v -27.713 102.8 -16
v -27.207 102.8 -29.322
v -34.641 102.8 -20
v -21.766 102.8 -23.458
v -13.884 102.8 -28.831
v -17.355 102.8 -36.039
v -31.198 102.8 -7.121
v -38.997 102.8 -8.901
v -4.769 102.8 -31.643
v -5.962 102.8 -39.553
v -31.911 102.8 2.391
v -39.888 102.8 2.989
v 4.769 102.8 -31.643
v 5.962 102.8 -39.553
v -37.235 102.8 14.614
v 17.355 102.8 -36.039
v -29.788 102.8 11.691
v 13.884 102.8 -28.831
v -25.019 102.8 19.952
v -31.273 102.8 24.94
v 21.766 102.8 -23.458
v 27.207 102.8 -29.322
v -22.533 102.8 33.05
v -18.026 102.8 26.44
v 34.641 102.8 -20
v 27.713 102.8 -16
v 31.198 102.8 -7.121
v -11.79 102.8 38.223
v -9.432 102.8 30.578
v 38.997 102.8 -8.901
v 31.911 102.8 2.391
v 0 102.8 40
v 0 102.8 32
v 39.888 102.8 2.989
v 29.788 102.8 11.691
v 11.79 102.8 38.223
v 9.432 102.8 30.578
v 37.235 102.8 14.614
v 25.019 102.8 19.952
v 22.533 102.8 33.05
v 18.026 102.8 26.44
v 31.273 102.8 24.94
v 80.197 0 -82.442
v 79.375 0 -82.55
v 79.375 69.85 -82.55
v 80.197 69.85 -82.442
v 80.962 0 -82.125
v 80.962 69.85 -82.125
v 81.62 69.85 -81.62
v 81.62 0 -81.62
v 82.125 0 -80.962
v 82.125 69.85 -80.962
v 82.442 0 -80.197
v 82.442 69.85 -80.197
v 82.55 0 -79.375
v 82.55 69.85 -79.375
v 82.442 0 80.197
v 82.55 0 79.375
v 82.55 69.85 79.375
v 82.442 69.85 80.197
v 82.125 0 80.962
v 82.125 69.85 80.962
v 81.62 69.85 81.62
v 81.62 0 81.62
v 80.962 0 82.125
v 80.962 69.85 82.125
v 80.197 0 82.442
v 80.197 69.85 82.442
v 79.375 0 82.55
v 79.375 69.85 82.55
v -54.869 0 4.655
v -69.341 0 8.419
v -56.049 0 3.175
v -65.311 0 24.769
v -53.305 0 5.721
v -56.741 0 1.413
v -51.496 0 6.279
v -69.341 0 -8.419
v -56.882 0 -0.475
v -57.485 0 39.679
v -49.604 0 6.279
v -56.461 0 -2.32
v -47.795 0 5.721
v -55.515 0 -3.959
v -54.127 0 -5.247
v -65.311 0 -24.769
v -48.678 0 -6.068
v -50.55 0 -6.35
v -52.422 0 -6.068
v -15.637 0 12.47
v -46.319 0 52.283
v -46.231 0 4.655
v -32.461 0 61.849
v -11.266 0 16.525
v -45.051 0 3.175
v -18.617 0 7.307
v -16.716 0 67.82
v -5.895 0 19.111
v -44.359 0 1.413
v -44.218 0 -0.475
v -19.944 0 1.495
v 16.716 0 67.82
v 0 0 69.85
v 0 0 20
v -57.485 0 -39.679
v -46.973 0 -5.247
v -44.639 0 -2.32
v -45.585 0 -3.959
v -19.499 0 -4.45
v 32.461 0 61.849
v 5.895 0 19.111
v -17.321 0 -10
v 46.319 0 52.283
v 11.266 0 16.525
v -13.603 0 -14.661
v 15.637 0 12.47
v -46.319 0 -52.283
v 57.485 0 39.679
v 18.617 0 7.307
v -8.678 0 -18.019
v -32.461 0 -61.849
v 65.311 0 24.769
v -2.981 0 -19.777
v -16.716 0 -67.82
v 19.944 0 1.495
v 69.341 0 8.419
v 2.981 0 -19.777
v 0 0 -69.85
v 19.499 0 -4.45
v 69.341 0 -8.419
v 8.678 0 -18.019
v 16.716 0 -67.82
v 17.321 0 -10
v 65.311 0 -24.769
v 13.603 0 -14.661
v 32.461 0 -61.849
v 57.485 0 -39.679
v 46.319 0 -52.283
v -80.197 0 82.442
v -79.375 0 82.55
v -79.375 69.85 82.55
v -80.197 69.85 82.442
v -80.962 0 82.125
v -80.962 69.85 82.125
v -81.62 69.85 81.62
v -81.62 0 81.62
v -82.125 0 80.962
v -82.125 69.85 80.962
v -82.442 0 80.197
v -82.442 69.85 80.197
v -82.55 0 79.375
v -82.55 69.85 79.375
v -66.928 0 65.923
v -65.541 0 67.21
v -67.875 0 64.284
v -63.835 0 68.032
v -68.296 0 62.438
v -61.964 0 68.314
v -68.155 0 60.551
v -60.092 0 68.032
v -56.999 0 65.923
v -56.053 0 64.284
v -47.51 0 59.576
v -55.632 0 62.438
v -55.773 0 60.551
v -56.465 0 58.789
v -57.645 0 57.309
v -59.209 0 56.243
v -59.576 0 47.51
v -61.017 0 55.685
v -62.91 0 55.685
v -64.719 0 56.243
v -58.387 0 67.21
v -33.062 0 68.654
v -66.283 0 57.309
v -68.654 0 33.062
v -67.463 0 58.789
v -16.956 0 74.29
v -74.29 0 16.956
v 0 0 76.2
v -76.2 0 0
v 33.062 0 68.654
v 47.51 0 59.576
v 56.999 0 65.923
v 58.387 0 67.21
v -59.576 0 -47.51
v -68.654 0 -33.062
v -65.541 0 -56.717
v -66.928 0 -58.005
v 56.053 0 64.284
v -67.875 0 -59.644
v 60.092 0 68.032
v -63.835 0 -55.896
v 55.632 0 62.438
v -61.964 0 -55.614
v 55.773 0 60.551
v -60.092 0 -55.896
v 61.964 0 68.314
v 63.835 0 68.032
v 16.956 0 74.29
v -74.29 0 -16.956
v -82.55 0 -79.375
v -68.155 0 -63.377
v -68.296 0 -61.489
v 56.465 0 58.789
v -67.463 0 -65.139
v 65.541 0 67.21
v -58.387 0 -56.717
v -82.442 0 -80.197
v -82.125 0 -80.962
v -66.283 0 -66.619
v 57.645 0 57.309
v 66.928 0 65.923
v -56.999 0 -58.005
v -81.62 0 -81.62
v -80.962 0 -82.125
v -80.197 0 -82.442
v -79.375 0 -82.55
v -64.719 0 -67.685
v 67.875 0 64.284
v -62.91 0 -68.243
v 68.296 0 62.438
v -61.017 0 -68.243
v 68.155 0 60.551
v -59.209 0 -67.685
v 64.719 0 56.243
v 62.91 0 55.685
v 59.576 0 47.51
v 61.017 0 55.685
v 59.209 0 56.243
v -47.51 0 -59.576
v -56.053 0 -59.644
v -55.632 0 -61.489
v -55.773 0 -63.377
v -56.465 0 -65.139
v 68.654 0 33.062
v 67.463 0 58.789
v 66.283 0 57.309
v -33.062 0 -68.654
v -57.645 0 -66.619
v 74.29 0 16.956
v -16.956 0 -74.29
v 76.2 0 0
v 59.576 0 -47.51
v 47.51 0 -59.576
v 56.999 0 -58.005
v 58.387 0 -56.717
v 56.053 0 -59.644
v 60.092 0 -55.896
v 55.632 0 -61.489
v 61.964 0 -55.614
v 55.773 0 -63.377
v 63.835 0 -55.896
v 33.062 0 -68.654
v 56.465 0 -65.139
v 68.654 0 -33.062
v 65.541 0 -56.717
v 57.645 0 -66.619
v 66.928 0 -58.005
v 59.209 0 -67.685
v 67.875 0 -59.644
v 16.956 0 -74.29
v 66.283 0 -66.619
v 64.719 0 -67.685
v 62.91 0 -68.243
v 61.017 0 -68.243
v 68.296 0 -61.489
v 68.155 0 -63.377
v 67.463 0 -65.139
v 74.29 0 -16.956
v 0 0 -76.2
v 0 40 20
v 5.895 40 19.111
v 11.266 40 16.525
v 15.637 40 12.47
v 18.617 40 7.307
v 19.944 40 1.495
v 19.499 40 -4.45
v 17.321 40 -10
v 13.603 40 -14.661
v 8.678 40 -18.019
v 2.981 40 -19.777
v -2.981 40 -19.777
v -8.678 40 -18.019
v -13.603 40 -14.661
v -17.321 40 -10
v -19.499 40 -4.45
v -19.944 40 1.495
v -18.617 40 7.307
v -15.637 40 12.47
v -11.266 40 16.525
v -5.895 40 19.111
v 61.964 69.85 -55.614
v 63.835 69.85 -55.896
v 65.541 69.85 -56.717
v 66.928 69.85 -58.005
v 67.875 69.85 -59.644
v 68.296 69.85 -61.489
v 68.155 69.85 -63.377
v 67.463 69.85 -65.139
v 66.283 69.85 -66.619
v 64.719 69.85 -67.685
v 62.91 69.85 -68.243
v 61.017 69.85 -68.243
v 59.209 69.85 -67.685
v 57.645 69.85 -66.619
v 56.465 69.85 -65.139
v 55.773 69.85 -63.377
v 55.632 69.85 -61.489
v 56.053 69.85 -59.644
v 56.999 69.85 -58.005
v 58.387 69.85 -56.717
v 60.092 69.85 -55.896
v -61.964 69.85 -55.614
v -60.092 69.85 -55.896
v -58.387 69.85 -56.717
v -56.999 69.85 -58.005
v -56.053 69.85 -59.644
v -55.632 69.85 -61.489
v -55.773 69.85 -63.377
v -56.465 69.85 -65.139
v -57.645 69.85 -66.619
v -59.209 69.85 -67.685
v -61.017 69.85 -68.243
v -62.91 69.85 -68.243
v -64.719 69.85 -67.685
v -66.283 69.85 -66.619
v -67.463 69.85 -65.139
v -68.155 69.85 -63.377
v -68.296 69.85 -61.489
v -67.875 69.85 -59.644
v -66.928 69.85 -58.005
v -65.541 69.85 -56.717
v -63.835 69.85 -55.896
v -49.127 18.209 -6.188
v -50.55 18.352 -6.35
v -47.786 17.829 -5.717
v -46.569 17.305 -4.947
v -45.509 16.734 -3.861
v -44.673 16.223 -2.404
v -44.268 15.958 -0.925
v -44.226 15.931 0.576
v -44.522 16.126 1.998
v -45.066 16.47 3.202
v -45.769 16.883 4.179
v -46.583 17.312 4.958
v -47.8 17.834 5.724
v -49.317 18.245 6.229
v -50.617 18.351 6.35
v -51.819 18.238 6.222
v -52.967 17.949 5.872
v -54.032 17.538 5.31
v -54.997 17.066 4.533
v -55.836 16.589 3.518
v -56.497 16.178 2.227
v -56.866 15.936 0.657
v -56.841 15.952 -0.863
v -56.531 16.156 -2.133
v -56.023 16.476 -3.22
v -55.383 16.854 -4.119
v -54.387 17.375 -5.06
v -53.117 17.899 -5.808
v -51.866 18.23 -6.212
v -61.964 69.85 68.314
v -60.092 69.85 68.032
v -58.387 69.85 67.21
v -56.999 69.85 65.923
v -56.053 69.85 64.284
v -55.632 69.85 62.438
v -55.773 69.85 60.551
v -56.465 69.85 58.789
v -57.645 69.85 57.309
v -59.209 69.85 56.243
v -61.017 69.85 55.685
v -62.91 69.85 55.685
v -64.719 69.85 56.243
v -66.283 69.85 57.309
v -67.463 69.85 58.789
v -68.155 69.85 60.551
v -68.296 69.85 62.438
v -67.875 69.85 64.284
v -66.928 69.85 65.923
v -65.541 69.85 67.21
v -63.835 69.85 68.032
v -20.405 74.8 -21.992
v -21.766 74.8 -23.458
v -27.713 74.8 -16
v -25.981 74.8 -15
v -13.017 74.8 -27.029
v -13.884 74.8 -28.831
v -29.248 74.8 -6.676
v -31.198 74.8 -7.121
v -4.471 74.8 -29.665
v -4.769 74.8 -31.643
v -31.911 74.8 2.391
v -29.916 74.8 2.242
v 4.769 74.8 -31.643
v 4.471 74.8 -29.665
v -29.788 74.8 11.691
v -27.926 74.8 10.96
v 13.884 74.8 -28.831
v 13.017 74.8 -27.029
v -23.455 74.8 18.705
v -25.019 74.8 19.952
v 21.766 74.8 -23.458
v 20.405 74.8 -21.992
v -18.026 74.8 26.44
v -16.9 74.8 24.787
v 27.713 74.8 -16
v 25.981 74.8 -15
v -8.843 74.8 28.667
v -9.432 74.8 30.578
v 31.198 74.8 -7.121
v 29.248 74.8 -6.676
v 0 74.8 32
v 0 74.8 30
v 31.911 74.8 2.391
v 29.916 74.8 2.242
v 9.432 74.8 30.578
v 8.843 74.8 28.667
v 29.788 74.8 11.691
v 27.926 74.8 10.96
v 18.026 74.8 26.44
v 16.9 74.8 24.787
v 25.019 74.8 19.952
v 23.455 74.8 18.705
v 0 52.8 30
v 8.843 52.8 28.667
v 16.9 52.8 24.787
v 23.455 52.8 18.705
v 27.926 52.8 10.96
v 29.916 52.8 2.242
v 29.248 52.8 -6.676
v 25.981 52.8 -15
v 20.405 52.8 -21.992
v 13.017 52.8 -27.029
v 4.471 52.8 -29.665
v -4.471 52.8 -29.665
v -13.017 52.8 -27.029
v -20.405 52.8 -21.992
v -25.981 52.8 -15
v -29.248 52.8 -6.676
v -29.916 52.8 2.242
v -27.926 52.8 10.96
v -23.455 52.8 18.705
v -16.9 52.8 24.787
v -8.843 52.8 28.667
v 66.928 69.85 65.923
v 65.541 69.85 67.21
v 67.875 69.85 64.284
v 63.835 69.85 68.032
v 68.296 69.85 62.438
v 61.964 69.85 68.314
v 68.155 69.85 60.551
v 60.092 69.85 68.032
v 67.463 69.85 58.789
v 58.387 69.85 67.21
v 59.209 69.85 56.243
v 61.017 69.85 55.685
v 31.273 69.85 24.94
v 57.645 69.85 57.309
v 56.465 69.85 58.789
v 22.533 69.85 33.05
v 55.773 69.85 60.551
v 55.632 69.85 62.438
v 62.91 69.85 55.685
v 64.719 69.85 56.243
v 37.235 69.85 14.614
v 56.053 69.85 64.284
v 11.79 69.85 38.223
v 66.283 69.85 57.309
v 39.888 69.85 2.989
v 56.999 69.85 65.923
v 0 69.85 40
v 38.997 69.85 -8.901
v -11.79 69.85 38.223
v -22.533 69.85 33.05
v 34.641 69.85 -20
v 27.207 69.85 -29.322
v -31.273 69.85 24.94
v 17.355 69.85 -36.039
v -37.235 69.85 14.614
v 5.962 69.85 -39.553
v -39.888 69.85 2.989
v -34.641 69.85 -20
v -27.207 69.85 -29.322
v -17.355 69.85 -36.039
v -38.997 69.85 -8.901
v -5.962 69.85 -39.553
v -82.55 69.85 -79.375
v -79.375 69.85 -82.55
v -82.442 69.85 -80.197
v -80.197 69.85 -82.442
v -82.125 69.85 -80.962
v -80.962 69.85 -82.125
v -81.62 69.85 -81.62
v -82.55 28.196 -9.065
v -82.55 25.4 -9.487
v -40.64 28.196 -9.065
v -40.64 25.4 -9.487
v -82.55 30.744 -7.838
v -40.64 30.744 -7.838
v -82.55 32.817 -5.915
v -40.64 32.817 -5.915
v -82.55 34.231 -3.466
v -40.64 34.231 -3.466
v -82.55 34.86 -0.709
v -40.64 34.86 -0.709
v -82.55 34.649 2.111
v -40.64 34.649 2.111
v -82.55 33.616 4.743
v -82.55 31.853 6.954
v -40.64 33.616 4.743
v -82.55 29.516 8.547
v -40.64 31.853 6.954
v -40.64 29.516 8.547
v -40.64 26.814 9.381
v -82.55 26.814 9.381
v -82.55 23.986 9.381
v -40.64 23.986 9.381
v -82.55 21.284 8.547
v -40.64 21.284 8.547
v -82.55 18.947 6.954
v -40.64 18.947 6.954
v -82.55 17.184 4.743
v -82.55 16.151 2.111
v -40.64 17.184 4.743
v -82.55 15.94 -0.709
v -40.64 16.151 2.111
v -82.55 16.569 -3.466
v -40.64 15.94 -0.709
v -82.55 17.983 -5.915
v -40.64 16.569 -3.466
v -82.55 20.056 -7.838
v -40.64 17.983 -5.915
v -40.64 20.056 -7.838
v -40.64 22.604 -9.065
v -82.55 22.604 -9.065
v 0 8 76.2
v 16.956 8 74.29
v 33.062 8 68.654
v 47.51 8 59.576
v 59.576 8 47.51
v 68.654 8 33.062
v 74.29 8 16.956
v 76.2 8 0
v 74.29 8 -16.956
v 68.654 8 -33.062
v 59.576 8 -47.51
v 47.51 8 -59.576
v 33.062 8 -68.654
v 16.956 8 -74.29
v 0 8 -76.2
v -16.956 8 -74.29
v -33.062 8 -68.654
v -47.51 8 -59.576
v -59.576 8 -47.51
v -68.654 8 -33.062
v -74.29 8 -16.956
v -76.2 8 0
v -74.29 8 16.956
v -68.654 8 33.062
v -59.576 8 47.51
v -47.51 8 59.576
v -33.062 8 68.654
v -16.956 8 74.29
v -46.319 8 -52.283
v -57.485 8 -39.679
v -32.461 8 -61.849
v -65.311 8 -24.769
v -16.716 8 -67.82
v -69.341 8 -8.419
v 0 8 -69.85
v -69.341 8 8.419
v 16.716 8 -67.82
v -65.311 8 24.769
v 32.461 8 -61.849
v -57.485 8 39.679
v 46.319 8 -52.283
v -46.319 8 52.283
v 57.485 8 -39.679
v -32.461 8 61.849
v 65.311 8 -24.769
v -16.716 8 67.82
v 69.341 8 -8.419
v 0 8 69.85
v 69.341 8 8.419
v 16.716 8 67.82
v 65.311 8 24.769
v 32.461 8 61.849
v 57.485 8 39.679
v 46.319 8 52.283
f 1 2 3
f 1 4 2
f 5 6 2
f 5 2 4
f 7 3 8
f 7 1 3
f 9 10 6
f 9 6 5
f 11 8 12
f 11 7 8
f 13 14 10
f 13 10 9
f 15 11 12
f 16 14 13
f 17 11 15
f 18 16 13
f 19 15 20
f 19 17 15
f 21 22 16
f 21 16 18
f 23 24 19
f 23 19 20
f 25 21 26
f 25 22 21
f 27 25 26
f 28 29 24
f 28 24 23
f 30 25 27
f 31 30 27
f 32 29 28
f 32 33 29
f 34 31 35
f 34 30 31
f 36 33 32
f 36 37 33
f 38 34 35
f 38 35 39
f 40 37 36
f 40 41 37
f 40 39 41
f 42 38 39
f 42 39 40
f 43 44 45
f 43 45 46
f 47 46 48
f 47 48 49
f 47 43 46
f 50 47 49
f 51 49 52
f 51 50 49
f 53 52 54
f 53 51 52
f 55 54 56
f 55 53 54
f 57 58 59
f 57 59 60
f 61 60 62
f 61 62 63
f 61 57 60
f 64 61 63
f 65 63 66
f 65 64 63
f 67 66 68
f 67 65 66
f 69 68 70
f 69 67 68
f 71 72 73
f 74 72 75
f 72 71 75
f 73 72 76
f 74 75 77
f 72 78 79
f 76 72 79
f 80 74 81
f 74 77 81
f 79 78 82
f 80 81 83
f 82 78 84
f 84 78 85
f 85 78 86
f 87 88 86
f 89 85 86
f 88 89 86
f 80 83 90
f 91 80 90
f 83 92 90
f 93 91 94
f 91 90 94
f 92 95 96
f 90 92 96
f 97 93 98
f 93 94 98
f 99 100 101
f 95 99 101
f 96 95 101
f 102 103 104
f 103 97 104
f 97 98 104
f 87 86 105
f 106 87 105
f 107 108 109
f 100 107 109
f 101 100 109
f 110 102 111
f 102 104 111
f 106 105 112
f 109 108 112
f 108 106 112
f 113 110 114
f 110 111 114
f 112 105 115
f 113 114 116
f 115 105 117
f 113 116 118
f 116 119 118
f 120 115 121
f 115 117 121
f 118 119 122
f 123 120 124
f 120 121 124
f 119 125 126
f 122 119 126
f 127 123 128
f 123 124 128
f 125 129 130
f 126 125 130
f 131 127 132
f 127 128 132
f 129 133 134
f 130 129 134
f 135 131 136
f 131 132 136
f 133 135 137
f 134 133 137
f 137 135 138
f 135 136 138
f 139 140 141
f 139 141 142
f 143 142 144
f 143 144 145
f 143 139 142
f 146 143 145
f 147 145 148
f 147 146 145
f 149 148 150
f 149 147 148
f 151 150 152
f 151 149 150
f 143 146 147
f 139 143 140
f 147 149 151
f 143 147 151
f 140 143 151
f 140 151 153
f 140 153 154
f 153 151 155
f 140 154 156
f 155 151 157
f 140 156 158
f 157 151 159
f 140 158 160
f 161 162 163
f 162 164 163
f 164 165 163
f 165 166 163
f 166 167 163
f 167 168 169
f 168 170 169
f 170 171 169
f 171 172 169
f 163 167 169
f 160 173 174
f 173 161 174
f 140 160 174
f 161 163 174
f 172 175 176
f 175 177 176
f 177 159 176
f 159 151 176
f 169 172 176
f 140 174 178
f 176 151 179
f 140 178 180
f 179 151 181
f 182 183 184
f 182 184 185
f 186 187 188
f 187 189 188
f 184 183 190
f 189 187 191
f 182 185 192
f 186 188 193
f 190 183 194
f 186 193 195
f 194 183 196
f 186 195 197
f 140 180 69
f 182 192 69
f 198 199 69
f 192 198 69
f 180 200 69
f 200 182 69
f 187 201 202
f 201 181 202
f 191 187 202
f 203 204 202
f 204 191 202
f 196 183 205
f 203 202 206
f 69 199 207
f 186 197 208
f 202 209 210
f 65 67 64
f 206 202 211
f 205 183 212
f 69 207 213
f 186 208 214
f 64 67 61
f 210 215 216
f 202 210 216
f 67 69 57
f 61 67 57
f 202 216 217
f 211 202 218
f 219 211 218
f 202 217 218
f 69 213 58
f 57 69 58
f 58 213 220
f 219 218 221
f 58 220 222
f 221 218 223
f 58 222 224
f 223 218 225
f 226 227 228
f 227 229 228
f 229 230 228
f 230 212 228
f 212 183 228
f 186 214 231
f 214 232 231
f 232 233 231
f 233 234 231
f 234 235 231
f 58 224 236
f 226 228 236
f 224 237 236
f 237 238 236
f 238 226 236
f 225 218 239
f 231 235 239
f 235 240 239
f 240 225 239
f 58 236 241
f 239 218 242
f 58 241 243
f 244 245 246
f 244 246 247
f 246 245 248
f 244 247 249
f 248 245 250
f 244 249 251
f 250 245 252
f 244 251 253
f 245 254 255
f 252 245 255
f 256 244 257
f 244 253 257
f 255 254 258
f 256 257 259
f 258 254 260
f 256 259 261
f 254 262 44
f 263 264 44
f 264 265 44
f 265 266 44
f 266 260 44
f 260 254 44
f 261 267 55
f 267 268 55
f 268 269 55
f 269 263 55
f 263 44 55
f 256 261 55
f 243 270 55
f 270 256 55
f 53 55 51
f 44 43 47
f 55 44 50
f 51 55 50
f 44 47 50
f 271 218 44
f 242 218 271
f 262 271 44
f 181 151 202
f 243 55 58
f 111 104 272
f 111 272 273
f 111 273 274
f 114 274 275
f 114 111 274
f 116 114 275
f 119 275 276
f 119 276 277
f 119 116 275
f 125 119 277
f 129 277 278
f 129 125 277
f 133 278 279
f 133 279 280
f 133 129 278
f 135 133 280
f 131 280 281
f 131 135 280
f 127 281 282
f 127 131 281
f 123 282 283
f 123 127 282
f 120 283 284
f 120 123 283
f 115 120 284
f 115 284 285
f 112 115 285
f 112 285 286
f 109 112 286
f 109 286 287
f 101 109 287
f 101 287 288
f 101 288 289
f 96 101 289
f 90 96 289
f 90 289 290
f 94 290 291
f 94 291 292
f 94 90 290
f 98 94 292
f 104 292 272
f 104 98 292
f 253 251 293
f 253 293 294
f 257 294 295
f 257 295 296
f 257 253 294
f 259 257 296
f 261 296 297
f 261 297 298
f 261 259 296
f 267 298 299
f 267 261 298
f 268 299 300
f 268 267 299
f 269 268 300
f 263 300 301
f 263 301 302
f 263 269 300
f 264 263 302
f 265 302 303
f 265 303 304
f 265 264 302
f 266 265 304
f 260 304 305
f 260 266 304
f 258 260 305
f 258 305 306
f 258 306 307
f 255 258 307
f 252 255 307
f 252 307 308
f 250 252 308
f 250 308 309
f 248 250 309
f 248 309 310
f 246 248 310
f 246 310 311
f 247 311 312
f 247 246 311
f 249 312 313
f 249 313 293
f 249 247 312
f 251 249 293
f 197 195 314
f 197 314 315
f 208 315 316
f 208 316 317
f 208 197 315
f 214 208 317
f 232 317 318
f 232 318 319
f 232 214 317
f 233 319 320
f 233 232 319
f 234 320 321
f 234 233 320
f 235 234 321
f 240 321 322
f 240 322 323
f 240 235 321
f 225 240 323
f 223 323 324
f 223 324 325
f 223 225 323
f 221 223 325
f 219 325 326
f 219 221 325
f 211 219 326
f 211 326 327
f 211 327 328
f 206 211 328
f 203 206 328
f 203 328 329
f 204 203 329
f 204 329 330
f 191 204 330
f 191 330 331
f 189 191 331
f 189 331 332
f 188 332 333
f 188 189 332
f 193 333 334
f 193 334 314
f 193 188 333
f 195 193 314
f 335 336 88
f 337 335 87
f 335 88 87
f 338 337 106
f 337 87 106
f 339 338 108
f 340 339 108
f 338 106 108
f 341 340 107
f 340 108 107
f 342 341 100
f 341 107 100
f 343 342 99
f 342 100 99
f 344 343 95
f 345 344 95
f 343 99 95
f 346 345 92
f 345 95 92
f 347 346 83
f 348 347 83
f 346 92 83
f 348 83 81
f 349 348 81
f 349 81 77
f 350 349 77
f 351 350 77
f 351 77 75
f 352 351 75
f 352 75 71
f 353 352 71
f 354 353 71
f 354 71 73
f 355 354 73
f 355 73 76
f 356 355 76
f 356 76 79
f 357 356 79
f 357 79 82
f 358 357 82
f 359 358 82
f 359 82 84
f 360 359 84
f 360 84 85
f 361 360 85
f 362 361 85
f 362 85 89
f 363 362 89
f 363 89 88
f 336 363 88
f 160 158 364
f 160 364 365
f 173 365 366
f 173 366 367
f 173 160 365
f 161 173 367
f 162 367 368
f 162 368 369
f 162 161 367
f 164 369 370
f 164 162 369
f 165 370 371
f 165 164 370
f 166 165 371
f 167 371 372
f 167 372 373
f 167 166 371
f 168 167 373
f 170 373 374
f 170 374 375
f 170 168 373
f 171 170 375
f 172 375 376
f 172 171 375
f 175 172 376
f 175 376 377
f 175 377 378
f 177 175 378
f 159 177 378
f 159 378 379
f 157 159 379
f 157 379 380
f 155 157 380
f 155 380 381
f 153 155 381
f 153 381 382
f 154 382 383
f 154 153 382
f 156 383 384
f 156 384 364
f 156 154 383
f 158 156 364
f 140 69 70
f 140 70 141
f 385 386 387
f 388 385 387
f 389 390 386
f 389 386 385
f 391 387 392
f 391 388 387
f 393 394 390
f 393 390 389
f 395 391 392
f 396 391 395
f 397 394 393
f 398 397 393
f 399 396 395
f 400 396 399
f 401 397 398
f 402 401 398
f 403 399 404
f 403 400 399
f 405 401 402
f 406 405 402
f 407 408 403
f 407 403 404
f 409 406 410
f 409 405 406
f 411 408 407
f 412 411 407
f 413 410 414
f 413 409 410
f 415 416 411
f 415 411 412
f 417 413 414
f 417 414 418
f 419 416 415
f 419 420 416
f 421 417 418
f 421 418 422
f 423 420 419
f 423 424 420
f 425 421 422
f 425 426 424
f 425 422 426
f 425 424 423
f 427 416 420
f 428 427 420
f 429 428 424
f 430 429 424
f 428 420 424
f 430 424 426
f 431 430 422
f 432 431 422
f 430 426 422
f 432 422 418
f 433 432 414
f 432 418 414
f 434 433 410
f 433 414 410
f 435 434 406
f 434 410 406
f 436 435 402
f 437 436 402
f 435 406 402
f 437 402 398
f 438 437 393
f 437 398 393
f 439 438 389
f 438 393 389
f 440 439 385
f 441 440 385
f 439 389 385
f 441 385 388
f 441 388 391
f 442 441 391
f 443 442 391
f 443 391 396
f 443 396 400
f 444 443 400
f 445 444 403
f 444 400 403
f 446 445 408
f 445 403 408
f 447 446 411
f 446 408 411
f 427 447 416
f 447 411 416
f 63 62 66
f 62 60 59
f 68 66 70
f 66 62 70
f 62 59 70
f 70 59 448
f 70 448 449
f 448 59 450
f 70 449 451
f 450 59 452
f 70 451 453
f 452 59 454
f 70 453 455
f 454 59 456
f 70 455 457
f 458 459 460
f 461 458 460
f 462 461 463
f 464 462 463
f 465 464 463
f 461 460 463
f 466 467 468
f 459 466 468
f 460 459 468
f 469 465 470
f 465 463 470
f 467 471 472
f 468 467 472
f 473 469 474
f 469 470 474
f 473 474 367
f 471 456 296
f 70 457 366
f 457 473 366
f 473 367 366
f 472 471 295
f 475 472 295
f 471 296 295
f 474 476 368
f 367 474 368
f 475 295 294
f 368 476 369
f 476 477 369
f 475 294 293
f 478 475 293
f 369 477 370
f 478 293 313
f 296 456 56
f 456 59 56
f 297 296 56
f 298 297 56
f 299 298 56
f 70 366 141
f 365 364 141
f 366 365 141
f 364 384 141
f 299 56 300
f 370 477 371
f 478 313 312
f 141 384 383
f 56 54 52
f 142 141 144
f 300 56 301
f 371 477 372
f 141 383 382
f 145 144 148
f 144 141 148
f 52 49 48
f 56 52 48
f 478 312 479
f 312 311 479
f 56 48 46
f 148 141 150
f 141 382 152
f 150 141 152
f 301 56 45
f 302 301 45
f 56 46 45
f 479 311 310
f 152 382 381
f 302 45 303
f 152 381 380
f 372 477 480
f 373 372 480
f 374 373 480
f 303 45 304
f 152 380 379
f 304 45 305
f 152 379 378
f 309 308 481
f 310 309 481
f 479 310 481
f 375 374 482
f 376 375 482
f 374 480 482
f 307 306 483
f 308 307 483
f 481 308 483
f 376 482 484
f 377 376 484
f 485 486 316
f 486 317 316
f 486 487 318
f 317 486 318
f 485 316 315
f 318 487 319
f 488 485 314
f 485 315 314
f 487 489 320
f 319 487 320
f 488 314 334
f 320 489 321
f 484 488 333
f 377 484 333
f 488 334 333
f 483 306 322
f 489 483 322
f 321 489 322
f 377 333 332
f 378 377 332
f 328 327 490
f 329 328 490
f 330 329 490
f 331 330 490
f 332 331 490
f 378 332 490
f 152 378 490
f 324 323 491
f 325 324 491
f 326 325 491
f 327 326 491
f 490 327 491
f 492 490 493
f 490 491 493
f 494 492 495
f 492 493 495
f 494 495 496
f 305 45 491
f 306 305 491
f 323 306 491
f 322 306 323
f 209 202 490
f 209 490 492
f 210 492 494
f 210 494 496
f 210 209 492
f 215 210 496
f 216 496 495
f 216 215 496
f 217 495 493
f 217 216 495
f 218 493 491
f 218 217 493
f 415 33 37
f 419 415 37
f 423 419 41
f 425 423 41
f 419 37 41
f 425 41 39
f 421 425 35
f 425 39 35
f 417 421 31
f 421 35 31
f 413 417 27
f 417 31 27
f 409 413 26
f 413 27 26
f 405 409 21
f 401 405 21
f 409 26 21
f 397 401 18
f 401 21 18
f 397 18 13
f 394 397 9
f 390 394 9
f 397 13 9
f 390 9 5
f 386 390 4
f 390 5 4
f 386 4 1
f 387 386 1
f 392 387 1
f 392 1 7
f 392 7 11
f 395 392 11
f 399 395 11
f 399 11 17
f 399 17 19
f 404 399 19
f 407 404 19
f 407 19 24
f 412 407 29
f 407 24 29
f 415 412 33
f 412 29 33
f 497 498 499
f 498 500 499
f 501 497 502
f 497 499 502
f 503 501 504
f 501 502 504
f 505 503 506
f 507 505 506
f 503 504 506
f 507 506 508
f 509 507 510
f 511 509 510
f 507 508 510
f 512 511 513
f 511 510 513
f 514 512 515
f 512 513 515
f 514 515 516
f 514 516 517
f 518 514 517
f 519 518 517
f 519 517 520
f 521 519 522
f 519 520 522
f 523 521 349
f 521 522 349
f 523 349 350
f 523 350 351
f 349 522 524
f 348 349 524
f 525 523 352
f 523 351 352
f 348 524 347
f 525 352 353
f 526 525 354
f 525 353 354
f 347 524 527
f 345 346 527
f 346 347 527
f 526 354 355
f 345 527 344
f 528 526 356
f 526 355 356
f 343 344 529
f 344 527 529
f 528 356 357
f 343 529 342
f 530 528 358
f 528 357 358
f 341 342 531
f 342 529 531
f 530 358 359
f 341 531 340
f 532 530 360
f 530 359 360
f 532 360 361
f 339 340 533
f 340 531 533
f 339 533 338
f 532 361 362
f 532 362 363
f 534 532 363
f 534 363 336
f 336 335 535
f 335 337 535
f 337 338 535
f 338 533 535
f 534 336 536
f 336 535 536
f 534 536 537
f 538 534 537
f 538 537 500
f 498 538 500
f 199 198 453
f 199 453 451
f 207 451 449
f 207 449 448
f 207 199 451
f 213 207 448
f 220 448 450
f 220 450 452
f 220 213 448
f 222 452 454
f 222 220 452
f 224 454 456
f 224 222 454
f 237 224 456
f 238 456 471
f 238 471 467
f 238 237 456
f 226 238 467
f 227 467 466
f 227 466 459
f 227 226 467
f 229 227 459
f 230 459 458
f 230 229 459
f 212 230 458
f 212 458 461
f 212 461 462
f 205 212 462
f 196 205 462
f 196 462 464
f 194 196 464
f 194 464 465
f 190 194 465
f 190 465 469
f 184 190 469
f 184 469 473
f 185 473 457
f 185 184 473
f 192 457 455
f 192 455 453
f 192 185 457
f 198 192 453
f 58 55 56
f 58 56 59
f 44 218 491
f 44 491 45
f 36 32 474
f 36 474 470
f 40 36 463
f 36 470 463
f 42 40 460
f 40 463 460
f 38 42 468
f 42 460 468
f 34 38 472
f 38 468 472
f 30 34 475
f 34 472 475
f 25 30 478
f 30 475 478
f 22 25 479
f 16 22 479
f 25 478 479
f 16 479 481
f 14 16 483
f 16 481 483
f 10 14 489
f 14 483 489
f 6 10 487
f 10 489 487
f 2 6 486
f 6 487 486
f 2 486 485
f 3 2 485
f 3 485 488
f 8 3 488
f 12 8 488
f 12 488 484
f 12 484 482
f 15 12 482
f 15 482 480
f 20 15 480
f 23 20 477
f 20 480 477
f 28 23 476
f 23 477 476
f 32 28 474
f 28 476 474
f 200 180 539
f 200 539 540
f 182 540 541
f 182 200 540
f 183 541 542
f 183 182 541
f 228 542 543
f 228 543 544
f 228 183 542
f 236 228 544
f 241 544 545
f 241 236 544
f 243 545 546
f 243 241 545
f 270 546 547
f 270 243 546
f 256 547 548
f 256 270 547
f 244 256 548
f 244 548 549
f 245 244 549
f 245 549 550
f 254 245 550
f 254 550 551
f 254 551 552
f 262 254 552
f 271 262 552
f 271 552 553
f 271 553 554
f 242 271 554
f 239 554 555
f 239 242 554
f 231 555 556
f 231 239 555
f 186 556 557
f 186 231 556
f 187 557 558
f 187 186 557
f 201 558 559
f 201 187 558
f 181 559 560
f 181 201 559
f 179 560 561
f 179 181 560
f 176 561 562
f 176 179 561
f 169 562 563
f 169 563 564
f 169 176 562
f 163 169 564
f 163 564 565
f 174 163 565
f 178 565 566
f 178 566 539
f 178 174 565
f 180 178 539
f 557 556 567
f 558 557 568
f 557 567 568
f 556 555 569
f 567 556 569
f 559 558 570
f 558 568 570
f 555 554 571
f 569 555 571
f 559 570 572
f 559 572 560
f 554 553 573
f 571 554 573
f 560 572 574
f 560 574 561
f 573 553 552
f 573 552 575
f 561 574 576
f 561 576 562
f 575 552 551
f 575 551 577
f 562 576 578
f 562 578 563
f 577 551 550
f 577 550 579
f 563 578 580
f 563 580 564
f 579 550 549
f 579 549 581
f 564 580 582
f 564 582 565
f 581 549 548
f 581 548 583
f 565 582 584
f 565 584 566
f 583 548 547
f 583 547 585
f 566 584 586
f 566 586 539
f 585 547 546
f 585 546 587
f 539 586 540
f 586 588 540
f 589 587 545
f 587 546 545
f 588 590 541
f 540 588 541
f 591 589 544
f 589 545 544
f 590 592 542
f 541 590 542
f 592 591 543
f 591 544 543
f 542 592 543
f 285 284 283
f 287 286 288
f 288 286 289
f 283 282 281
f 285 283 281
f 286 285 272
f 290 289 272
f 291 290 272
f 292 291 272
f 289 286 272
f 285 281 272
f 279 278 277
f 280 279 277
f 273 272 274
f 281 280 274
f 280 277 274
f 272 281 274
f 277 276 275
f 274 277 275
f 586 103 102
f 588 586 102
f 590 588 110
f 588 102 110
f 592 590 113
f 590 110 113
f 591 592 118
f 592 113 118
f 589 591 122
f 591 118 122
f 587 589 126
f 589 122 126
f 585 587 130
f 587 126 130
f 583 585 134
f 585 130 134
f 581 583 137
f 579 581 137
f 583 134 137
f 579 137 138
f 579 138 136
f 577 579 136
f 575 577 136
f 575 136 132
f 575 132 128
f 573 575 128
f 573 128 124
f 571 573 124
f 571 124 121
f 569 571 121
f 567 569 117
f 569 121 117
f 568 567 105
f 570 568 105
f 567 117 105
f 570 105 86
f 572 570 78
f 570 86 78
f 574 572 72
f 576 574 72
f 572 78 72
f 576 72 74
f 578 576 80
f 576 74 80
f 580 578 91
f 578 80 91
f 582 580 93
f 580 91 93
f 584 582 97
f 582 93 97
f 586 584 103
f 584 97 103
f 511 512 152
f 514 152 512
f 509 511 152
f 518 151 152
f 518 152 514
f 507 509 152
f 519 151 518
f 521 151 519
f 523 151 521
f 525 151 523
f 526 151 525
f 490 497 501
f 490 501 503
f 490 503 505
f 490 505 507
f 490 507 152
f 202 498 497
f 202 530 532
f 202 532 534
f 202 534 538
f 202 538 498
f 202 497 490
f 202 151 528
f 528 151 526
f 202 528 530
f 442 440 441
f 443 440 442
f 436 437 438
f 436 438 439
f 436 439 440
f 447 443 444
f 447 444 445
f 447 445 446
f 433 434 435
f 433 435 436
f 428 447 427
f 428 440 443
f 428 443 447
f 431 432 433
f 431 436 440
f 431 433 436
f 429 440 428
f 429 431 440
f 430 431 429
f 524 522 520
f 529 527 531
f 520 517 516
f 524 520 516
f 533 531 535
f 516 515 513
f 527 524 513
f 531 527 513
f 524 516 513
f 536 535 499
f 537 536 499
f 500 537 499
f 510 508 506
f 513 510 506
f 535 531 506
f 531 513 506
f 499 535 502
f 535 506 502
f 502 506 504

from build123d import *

# Parameters (mm, degrees)
SKETCH1_R                        = 76.2
SKETCH1_R_2                      = 6.35
SKETCH1_R_3                      = 69.85
SKETCH1_R_4                      = 20
BOSS_EXTRUDE1_DEPTH              = 69.85
SKETCH1_3_R                      = 20
CUT_EXTRUDE1_DEPTH               = 40
SKETCH1_4_R                      = 76.2
SKETCH1_4_R_2                    = 69.85
CUT_EXTRUDE2_DEPTH               = 8
SKETCH2_R                        = 40
SKETCH2_R_2                      = 30
SKETCH2_R_3                      = 27
BOSS_EXTRUDE2_DEPTH              = 32.95
SKETCH3_R                        = 32
CUT_EXTRUDE5_DEPTH               = 28
SKETCH4_R                        = 30
CUT_EXTRUDE6_DEPTH               = 22
F_1_2_14_NPSM_TAPPED_HOLE2_D     = 18.9738
F_1_2_14_NPSM_TAPPED_HOLE2_DEPTH = 41.91
CUT_EXTRUDE7_REACH               = 157.553
CUT_EXTRUDE7_END_RADIUS          = 9.4869
SKETCH12_R                       = 6.35


with BuildPart() as part:
    # Sketch1 → Boss-Extrude1 (new body)
    # profile 1 of 4: a face of its own
    with BuildSketch(Plane(origin=(0, 0, 0), x_dir=(1, 0, 0), z_dir=(0, 1, 0))):
        with BuildLine():
            ThreePointArc((79.375, 82.55), (81.62006403, 81.62006403), (82.55, 79.375))
            Line((82.55, 79.375), (82.55, -79.375))
            ThreePointArc((82.55, -79.375), (81.62006403, -81.62006403), (79.375, -82.55))
            Line((79.375, -82.55), (-79.375, -82.55))
            ThreePointArc((-79.375, -82.55), (-81.62006403, -81.62006403), (-82.55, -79.375))
            Line((-82.55, -79.375), (-82.55, 79.375))
            ThreePointArc((-82.55, 79.375), (-81.62006403, 81.62006403), (-79.375, 82.55))
            Line((-79.375, 82.55), (79.375, 82.55))
        make_face()
        Circle(SKETCH1_R, mode=Mode.SUBTRACT)
        with Locations(Location((-61.963767235, 61.963767235, 0), (0, 0, 270))):
            Circle(SKETCH1_R_2, mode=Mode.SUBTRACT)
        with Locations(Location((-61.963767235, -61.963767235, 0), (0, 0, 270))):
            Circle(SKETCH1_R_2, mode=Mode.SUBTRACT)
        with Locations(Location((61.963767235, -61.963767235, 0), (0, 0, 270))):
            Circle(SKETCH1_R_2, mode=Mode.SUBTRACT)
        with Locations(Location((61.963767235, 61.963767235, 0), (0, 0, 270))):
            Circle(SKETCH1_R_2, mode=Mode.SUBTRACT)
    # profile 2 of 4: a face of its own
    with BuildSketch(Plane(origin=(0, 0, 0), x_dir=(1, 0, 0), z_dir=(0, 1, 0))):
        Circle(SKETCH1_R)
        Circle(SKETCH1_R_3, mode=Mode.SUBTRACT)
    # profile 3 of 4: a face of its own
    with BuildSketch(Plane(origin=(0, 0, 0), x_dir=(1, 0, 0), z_dir=(0, 1, 0))):
        Circle(SKETCH1_R_3)
        Circle(SKETCH1_R_4, mode=Mode.SUBTRACT)
    # profile 4 of 4: a face of its own
    with BuildSketch(Plane(origin=(0, 0, 0), x_dir=(1, 0, 0), z_dir=(0, 1, 0))):
        Circle(SKETCH1_R_4)
    extrude(amount=BOSS_EXTRUDE1_DEPTH)

    # Sketch1<3> → Cut-Extrude1 (cut)
    with BuildSketch(Plane(origin=(0, 0, 0), x_dir=(1, 0, 0), z_dir=(0, 1, 0))):
        with Locations(Location((0, 0, 0), (0, 0, 270))):
            Circle(SKETCH1_3_R)
    extrude(amount=CUT_EXTRUDE1_DEPTH, mode=Mode.SUBTRACT)

    # Sketch1<4> → Cut-Extrude2 (cut)
    with BuildSketch(Plane(origin=(0, 0, 0), x_dir=(1, 0, 0), z_dir=(0, 1, 0))):
        with Locations(Location((0, 0, 0), (0, 0, 270))):
            Circle(SKETCH1_4_R)
        with Locations(Location((0, 0, 0), (0, 0, 270))):
            Circle(SKETCH1_4_R_2, mode=Mode.SUBTRACT)
    extrude(amount=CUT_EXTRUDE2_DEPTH, mode=Mode.SUBTRACT)

    # Sketch2 → Boss-Extrude2 (add)
    # profile 1 of 3: a face of its own
    with BuildSketch(Plane(origin=(0, 69.85, 0), x_dir=(1, 0, 0), z_dir=(0, 1, 0))):
        with Locations(Location((0, 0, 0), (0, 0, 270))):
            Circle(SKETCH2_R)
        Circle(SKETCH2_R_2, mode=Mode.SUBTRACT)
    # profile 2 of 3: a face of its own
    with BuildSketch(Plane(origin=(0, 69.85, 0), x_dir=(1, 0, 0), z_dir=(0, 1, 0))):
        Circle(SKETCH2_R_2)
        Circle(SKETCH2_R_3, mode=Mode.SUBTRACT)
    # profile 3 of 3: a face of its own
    with BuildSketch(Plane(origin=(0, 69.85, 0), x_dir=(1, 0, 0), z_dir=(0, 1, 0))):
        Circle(SKETCH2_R_3)
    extrude(amount=BOSS_EXTRUDE2_DEPTH)

    # Sketch3 → Cut-Extrude5 (cut)
    with BuildSketch(Plane(origin=(0, 102.8, 0), x_dir=(1, 0, 0), z_dir=(0, 1, 0))):
        with Locations(Location((0, 0, 0), (0, 0, 270))):
            Circle(SKETCH3_R)
    extrude(amount=-CUT_EXTRUDE5_DEPTH, mode=Mode.SUBTRACT)

    # Sketch4 → Cut-Extrude6 (cut)
    with BuildSketch(Plane(origin=(0, 74.8, 0), x_dir=(1, 0, 0), z_dir=(0, 1, 0))):
        with Locations(Location((0, 0, 0), (0, 0, 270))):
            Circle(SKETCH4_R)
    extrude(amount=-CUT_EXTRUDE6_DEPTH, mode=Mode.SUBTRACT)

    # 1/2-14 NPSM Tapped Hole2
    with Locations(Plane.ZY.offset(82.55)):
        with Locations((0, 25.4)):
            Hole(F_1_2_14_NPSM_TAPPED_HOLE2_D / 2, depth=F_1_2_14_NPSM_TAPPED_HOLE2_DEPTH)

    # Cut-Extrude7: up to this cylinder (the profile starts outside it)
    cut_extrude7_end = Plane(origin=(-50.55, 25.4, 0), z_dir=(-1, 0, 0)) * Cylinder(CUT_EXTRUDE7_END_RADIUS, 335.0798, mode=Mode.PRIVATE)
    # Sketch12 → Cut-Extrude7 (cut, up to the surface)
    with BuildSketch(Plane.XZ, mode=Mode.PRIVATE) as cut_extrude7_sk1:
        with Locations(Location((-50.55, 0, 0), (0, 0, 270))):
            Circle(SKETCH12_R)
    cut_extrude7_tool1 = extrude(cut_extrude7_sk1.sketch, amount=-CUT_EXTRUDE7_REACH, mode=Mode.PRIVATE) - cut_extrude7_end
    add(cut_extrude7_tool1.solids().sort_by_distance((-50.55, 0, 0))[0], mode=Mode.SUBTRACT)


solid = part.part
